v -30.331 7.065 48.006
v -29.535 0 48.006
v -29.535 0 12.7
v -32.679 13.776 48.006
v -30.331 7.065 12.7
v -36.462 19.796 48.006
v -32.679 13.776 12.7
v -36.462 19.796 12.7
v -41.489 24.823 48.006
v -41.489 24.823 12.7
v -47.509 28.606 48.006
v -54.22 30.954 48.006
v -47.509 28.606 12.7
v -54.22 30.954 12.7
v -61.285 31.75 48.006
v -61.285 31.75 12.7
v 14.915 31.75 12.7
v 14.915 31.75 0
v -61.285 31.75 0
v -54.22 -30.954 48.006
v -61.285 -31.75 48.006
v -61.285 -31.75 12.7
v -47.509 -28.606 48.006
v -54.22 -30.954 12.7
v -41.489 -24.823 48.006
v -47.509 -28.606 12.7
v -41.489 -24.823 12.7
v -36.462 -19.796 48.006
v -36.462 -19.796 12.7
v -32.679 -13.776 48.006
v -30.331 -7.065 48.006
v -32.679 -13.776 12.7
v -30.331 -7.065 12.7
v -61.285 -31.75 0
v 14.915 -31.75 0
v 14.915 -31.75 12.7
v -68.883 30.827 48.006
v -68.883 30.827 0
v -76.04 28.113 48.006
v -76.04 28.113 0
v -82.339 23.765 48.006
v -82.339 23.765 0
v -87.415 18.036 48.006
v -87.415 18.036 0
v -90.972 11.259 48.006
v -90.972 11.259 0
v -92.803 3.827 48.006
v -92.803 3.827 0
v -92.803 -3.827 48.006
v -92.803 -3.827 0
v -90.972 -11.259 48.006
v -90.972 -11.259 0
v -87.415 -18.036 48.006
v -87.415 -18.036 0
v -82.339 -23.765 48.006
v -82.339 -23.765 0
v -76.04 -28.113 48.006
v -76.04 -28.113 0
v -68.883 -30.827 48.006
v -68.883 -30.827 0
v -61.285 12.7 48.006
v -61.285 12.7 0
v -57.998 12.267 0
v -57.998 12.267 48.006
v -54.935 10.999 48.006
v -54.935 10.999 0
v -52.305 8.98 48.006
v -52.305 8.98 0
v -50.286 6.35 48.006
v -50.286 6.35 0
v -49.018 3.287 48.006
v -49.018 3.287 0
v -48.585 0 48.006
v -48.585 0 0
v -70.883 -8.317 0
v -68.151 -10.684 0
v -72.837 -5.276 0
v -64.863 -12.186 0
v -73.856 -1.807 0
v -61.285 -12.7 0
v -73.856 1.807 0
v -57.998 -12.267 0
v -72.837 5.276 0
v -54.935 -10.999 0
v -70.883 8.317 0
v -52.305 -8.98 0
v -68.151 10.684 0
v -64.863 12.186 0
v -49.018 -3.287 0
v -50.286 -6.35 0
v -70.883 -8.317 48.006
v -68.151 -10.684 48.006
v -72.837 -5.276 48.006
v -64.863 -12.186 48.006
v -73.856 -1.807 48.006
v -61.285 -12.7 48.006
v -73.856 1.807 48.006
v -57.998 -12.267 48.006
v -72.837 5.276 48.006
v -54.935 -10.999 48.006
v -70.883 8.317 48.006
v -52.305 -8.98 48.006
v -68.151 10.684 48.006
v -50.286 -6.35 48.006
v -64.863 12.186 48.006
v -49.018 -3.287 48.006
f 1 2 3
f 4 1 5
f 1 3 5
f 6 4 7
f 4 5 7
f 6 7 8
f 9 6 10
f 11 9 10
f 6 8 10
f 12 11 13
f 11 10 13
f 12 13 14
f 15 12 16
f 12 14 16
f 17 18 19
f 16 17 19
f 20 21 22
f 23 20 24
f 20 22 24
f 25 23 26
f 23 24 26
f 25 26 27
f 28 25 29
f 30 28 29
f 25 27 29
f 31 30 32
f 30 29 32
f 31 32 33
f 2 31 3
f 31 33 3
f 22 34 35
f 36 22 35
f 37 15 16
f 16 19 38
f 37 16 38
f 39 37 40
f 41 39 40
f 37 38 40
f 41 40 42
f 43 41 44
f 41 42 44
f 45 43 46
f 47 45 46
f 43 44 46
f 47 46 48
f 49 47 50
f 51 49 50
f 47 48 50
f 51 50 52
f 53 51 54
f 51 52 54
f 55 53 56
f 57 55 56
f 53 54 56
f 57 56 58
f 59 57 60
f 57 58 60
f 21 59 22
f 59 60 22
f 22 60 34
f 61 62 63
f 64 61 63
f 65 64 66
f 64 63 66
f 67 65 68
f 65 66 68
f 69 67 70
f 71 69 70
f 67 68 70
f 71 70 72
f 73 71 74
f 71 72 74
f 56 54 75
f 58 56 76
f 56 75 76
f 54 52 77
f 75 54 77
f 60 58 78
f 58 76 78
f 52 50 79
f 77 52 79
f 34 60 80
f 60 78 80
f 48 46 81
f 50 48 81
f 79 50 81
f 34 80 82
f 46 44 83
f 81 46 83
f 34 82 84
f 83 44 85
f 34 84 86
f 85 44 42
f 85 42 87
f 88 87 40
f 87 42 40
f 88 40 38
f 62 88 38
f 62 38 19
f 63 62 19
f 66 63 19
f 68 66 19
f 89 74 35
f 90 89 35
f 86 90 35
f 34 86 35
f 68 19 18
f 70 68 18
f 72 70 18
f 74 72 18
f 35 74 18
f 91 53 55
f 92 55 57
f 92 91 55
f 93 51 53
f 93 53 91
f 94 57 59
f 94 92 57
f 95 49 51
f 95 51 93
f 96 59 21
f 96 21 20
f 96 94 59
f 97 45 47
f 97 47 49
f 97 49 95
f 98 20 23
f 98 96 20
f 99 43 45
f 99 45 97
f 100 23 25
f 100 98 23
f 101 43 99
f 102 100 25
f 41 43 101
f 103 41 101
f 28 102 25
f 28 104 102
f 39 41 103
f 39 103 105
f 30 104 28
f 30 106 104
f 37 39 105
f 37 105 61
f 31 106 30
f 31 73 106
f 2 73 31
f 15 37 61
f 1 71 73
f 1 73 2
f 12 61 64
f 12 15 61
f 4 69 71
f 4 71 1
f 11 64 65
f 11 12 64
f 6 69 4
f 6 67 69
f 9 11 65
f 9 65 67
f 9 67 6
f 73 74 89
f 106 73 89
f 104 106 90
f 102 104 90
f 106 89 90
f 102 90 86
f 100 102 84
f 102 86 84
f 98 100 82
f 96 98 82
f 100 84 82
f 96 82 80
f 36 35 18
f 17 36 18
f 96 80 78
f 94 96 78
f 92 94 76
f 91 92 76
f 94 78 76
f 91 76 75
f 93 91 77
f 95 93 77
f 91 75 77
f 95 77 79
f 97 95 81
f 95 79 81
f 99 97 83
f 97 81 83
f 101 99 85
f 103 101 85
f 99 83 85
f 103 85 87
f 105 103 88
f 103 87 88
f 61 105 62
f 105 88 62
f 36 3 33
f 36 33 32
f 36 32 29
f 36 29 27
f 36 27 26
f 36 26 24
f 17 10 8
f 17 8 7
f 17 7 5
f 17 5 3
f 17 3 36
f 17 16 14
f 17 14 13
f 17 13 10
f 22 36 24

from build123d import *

# Parameters (mm, degrees)
F1_DEPTH = 48.006
F2_DEPTH = 12.7


with BuildPart() as f1:
    # F0 (on Top) → F1 (new body)
    with BuildSketch(Plane.XY):
        with BuildLine():
            ThreePointArc((-29.534948, 0), (-38.834308, 22.45064), (-61.284948, 31.75))
            Line((-61.284948, 31.75), (-61.284948, 12.7))
            ThreePointArc((-61.284948, 12.7), (-52.304692, 8.980256), (-48.584948, 0))
            ThreePointArc((-48.584948, 0), (-52.304692, -8.980256), (-61.284948, -12.7))
            Line((-61.284948, -12.7), (-61.284948, -31.75))
            ThreePointArc((-61.284948, -31.75), (-38.834308, -22.45064), (-29.534948, 0))
        make_face()
        with BuildLine():
            Line((-61.284948, 12.7), (-61.284948, 31.75))
            ThreePointArc((-61.284948, 31.75), (-93.034948, 0), (-61.284948, -31.75))
            Line((-61.284948, -31.75), (-61.284948, -12.7))
            ThreePointArc((-61.284948, -12.7), (-73.984948, 0), (-61.284948, 12.7))
        make_face()
    extrude(amount=F1_DEPTH)

    # F0 (on Top) → F2 (join)
    with BuildSketch(Plane.XY):
        with BuildLine():
            Line((14.915052, 31.75), (-61.284948, 31.75))
            ThreePointArc((-61.284948, 31.75), (-38.834308, 22.45064), (-29.534948, 0))
            ThreePointArc((-29.534948, 0), (-38.834308, -22.45064), (-61.284948, -31.75))
            Line((-61.284948, -31.75), (14.915052, -31.75))
            Line((14.915052, -31.75), (14.915052, 31.75))
        make_face()
    extrude(amount=F2_DEPTH)


solid = f1.part
